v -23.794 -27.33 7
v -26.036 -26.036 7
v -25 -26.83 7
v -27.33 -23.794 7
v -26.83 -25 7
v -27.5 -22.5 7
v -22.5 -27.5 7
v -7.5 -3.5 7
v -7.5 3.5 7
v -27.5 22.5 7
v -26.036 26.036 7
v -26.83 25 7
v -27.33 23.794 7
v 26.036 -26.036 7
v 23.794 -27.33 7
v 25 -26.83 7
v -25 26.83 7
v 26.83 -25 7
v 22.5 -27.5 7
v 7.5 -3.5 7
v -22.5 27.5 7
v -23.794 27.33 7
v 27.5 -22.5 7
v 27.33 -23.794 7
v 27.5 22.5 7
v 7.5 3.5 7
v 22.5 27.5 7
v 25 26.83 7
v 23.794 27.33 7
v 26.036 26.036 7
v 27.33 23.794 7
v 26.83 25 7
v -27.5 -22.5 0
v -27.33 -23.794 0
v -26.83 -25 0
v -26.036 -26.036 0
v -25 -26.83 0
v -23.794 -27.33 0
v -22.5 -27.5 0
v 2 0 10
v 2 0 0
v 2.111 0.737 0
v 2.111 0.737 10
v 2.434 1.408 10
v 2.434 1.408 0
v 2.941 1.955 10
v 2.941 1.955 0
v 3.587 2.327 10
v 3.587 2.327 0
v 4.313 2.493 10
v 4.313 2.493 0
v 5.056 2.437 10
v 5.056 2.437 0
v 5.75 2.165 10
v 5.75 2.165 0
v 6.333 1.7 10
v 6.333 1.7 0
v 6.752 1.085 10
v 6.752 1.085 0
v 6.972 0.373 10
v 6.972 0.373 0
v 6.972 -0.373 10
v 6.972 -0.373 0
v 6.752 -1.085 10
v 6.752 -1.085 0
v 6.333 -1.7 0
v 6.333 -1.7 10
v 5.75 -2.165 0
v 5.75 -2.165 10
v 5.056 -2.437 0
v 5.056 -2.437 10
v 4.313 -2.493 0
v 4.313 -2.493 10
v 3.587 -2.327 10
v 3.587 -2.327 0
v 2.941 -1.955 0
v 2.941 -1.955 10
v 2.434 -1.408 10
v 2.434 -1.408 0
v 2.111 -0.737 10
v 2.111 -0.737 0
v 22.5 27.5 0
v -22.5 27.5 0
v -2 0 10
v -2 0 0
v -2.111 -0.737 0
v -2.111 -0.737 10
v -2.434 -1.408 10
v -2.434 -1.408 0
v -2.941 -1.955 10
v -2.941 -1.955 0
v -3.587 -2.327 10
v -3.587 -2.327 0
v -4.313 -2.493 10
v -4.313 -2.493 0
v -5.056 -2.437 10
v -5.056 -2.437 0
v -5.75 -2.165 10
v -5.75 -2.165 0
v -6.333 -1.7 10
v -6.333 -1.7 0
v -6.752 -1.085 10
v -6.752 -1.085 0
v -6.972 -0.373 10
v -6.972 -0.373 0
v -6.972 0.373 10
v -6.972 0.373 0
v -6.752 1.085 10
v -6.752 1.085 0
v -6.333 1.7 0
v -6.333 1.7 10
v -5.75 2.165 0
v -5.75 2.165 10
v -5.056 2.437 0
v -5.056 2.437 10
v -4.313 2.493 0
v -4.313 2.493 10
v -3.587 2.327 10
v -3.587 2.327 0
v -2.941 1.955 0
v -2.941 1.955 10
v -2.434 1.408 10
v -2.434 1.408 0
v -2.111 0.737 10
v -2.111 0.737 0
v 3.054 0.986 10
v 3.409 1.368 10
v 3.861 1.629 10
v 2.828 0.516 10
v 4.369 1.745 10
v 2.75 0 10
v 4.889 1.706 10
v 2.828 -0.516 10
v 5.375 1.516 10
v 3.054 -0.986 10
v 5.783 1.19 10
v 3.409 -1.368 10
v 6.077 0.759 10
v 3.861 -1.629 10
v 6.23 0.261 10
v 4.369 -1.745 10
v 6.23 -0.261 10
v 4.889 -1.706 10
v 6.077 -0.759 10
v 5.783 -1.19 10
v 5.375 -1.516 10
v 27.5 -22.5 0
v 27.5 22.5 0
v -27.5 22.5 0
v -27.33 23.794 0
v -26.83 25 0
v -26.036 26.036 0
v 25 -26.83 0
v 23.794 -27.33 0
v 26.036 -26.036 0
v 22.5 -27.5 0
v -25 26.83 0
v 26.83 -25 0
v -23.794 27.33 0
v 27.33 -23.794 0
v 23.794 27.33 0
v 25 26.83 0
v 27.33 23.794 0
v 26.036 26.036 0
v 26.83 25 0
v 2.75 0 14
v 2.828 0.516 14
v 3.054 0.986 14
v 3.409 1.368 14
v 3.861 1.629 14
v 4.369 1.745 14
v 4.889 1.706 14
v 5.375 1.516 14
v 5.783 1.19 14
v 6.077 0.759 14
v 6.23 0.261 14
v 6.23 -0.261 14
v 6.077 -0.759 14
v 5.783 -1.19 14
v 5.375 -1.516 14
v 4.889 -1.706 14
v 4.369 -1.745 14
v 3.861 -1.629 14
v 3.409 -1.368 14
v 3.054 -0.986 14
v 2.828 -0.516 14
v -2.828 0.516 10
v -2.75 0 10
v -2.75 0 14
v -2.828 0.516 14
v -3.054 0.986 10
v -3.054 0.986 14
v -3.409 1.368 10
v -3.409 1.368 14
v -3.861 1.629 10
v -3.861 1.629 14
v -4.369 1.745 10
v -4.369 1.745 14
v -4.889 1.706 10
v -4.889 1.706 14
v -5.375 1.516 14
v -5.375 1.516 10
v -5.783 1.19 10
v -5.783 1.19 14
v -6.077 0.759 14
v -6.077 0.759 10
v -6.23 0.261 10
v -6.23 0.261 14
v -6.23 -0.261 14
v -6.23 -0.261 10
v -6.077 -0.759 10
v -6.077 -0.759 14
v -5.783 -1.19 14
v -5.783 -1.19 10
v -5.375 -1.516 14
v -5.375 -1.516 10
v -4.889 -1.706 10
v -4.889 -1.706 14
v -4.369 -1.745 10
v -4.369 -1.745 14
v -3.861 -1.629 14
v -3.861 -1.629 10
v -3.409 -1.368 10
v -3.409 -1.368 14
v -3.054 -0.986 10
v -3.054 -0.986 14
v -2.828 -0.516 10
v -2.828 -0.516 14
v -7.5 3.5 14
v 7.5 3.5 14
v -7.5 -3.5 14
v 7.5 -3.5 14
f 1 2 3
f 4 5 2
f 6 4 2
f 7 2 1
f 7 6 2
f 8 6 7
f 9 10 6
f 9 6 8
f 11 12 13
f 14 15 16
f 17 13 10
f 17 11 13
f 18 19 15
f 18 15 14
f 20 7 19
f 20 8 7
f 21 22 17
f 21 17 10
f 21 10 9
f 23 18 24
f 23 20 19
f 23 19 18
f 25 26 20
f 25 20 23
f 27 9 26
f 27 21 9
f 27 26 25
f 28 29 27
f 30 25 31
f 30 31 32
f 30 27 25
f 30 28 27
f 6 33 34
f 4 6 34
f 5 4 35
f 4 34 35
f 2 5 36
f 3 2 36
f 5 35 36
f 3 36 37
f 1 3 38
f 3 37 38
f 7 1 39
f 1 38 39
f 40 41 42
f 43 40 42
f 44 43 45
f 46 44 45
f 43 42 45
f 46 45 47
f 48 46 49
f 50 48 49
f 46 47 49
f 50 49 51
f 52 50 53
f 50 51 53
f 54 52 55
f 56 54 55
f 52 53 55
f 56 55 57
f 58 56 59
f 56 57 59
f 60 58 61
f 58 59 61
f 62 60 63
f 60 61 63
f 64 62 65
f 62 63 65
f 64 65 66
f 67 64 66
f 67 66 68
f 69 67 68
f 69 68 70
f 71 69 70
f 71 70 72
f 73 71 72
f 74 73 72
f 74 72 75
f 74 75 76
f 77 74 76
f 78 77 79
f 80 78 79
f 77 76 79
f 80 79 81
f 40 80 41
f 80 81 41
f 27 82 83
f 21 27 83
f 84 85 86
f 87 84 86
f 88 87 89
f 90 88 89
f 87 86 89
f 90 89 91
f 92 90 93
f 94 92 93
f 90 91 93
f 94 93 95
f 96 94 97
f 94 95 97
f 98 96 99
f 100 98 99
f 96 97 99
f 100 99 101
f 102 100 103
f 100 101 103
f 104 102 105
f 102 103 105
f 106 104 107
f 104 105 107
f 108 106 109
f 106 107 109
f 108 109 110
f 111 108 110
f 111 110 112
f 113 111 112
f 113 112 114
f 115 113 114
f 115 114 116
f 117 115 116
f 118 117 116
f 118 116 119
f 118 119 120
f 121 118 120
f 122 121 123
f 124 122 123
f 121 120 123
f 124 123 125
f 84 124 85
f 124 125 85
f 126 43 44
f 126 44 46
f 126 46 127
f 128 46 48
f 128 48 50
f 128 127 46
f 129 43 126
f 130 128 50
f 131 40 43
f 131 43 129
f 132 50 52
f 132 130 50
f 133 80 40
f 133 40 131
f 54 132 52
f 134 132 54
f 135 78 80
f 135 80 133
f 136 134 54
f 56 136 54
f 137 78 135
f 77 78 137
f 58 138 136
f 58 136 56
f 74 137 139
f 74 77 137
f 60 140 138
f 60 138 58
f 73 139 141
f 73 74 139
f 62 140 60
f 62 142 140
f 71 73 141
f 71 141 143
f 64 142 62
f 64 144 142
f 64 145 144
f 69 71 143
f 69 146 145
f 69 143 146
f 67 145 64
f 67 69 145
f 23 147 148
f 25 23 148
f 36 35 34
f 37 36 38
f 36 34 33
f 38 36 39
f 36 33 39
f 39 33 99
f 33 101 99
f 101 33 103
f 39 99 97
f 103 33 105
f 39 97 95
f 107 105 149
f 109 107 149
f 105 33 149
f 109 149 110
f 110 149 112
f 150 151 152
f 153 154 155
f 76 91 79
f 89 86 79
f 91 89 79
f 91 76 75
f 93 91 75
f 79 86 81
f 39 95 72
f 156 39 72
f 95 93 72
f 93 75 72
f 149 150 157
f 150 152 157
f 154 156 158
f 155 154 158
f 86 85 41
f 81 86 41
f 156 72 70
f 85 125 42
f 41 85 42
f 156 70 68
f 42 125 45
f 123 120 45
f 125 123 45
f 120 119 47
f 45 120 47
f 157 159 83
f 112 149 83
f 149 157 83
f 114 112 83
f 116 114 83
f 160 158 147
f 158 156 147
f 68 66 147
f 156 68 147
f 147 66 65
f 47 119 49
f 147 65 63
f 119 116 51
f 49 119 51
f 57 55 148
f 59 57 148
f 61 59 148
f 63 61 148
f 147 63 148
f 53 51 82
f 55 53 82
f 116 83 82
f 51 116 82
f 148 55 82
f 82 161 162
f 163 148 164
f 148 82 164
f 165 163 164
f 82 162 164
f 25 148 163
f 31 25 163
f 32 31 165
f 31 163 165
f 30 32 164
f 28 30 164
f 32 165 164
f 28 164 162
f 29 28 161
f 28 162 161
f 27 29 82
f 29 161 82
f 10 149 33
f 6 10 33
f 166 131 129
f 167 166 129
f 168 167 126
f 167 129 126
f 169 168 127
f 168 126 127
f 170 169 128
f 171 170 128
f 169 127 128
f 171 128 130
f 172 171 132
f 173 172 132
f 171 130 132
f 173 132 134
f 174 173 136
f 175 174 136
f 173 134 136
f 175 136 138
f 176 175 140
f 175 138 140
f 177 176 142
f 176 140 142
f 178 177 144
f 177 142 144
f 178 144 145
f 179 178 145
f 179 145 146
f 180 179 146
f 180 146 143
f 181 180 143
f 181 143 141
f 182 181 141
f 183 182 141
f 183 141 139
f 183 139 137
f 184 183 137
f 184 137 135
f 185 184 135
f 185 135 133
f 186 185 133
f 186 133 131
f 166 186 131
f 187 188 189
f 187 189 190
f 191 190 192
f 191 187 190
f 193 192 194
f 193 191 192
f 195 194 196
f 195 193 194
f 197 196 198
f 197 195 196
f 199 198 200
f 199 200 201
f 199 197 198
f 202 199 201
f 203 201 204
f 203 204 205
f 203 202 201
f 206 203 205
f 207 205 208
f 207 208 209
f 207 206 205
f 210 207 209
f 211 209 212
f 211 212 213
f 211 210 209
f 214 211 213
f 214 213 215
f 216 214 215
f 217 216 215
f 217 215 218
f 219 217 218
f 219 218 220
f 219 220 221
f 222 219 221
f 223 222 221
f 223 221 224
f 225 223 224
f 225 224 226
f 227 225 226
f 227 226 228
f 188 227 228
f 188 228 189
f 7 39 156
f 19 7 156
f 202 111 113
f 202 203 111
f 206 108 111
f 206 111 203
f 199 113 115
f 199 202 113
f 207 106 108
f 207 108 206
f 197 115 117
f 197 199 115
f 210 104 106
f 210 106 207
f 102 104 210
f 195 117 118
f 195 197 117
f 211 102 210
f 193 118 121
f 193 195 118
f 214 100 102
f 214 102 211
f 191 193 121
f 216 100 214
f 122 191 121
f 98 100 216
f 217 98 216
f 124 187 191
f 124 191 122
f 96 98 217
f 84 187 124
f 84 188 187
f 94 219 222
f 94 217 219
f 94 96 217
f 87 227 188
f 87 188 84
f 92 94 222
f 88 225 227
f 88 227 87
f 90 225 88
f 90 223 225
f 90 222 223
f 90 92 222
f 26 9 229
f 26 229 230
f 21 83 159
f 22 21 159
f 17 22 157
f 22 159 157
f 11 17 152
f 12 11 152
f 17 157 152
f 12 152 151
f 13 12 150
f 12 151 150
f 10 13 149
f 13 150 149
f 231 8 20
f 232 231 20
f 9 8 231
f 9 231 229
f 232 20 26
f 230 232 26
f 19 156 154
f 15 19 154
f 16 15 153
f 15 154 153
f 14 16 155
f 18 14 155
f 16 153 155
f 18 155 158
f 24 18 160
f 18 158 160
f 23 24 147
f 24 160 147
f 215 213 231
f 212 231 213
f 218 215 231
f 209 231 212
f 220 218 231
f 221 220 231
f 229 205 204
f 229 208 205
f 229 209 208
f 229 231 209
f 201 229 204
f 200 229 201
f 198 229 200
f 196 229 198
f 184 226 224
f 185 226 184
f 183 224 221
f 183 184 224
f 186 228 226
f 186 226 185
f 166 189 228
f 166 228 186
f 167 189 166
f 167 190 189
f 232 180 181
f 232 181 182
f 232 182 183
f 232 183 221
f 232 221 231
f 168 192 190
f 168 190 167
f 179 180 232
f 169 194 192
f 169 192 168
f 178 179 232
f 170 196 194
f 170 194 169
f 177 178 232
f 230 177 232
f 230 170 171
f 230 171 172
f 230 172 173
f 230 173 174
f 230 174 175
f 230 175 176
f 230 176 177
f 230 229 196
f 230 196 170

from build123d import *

# Parameters (mm, degrees)
F1_DEPTH = 7
F2_W     = 15
F2_H     = 7
F2_R     = 1.75
F3_DEPTH = 7
F4_R     = 2.5
F5_DEPTH = 10


with BuildPart() as f1:
    # F0 (on Top) → F1 (new body)
    with BuildSketch(Plane.XY):
        with BuildLine():
            ThreePointArc((27.5, 22.5), (26.035534, 26.035534), (22.5, 27.5))
            Line((22.5, 27.5), (-22.5, 27.5))
            ThreePointArc((-22.5, 27.5), (-26.035534, 26.035534), (-27.5, 22.5))
            Line((-27.5, 22.5), (-27.5, -22.5))
            ThreePointArc((-27.5, -22.5), (-26.035534, -26.035534), (-22.5, -27.5))
            Line((-22.5, -27.5), (22.5, -27.5))
            ThreePointArc((22.5, -27.5), (26.035534, -26.035534), (27.5, -22.5))
            Line((27.5, -22.5), (27.5, 22.5))
        make_face()
    extrude(amount=F1_DEPTH)

    # F2 (on face) → F3 (join)
    with BuildSketch(Plane.XY.offset(7)):
        Rectangle(F2_W, F2_H)
        with Locations((-4.5, 0)):
            Circle(F2_R, mode=Mode.SUBTRACT)
        with BuildLine():
            ThreePointArc((6.25, 0), (4.5, -1.75), (2.75, 0))
            ThreePointArc((2.75, 0), (4.5, 1.75), (6.25, 0))
        make_face(mode=Mode.SUBTRACT)
    extrude(amount=F3_DEPTH)

    # F4 (on face) → F5 (cut)
    with BuildSketch(Plane(origin=(0, 0, 0), x_dir=(1, 0, 0), z_dir=(0, 0, -1))):
        with Locations((-4.5, 0)):
            Circle(F4_R)
        with BuildLine():
            ThreePointArc((7, 0), (4.5, 2.5), (2, 0))
            ThreePointArc((2, 0), (4.5, -2.5), (7, 0))
        make_face()
    extrude(amount=-F5_DEPTH, mode=Mode.SUBTRACT)


solid = f1.part
